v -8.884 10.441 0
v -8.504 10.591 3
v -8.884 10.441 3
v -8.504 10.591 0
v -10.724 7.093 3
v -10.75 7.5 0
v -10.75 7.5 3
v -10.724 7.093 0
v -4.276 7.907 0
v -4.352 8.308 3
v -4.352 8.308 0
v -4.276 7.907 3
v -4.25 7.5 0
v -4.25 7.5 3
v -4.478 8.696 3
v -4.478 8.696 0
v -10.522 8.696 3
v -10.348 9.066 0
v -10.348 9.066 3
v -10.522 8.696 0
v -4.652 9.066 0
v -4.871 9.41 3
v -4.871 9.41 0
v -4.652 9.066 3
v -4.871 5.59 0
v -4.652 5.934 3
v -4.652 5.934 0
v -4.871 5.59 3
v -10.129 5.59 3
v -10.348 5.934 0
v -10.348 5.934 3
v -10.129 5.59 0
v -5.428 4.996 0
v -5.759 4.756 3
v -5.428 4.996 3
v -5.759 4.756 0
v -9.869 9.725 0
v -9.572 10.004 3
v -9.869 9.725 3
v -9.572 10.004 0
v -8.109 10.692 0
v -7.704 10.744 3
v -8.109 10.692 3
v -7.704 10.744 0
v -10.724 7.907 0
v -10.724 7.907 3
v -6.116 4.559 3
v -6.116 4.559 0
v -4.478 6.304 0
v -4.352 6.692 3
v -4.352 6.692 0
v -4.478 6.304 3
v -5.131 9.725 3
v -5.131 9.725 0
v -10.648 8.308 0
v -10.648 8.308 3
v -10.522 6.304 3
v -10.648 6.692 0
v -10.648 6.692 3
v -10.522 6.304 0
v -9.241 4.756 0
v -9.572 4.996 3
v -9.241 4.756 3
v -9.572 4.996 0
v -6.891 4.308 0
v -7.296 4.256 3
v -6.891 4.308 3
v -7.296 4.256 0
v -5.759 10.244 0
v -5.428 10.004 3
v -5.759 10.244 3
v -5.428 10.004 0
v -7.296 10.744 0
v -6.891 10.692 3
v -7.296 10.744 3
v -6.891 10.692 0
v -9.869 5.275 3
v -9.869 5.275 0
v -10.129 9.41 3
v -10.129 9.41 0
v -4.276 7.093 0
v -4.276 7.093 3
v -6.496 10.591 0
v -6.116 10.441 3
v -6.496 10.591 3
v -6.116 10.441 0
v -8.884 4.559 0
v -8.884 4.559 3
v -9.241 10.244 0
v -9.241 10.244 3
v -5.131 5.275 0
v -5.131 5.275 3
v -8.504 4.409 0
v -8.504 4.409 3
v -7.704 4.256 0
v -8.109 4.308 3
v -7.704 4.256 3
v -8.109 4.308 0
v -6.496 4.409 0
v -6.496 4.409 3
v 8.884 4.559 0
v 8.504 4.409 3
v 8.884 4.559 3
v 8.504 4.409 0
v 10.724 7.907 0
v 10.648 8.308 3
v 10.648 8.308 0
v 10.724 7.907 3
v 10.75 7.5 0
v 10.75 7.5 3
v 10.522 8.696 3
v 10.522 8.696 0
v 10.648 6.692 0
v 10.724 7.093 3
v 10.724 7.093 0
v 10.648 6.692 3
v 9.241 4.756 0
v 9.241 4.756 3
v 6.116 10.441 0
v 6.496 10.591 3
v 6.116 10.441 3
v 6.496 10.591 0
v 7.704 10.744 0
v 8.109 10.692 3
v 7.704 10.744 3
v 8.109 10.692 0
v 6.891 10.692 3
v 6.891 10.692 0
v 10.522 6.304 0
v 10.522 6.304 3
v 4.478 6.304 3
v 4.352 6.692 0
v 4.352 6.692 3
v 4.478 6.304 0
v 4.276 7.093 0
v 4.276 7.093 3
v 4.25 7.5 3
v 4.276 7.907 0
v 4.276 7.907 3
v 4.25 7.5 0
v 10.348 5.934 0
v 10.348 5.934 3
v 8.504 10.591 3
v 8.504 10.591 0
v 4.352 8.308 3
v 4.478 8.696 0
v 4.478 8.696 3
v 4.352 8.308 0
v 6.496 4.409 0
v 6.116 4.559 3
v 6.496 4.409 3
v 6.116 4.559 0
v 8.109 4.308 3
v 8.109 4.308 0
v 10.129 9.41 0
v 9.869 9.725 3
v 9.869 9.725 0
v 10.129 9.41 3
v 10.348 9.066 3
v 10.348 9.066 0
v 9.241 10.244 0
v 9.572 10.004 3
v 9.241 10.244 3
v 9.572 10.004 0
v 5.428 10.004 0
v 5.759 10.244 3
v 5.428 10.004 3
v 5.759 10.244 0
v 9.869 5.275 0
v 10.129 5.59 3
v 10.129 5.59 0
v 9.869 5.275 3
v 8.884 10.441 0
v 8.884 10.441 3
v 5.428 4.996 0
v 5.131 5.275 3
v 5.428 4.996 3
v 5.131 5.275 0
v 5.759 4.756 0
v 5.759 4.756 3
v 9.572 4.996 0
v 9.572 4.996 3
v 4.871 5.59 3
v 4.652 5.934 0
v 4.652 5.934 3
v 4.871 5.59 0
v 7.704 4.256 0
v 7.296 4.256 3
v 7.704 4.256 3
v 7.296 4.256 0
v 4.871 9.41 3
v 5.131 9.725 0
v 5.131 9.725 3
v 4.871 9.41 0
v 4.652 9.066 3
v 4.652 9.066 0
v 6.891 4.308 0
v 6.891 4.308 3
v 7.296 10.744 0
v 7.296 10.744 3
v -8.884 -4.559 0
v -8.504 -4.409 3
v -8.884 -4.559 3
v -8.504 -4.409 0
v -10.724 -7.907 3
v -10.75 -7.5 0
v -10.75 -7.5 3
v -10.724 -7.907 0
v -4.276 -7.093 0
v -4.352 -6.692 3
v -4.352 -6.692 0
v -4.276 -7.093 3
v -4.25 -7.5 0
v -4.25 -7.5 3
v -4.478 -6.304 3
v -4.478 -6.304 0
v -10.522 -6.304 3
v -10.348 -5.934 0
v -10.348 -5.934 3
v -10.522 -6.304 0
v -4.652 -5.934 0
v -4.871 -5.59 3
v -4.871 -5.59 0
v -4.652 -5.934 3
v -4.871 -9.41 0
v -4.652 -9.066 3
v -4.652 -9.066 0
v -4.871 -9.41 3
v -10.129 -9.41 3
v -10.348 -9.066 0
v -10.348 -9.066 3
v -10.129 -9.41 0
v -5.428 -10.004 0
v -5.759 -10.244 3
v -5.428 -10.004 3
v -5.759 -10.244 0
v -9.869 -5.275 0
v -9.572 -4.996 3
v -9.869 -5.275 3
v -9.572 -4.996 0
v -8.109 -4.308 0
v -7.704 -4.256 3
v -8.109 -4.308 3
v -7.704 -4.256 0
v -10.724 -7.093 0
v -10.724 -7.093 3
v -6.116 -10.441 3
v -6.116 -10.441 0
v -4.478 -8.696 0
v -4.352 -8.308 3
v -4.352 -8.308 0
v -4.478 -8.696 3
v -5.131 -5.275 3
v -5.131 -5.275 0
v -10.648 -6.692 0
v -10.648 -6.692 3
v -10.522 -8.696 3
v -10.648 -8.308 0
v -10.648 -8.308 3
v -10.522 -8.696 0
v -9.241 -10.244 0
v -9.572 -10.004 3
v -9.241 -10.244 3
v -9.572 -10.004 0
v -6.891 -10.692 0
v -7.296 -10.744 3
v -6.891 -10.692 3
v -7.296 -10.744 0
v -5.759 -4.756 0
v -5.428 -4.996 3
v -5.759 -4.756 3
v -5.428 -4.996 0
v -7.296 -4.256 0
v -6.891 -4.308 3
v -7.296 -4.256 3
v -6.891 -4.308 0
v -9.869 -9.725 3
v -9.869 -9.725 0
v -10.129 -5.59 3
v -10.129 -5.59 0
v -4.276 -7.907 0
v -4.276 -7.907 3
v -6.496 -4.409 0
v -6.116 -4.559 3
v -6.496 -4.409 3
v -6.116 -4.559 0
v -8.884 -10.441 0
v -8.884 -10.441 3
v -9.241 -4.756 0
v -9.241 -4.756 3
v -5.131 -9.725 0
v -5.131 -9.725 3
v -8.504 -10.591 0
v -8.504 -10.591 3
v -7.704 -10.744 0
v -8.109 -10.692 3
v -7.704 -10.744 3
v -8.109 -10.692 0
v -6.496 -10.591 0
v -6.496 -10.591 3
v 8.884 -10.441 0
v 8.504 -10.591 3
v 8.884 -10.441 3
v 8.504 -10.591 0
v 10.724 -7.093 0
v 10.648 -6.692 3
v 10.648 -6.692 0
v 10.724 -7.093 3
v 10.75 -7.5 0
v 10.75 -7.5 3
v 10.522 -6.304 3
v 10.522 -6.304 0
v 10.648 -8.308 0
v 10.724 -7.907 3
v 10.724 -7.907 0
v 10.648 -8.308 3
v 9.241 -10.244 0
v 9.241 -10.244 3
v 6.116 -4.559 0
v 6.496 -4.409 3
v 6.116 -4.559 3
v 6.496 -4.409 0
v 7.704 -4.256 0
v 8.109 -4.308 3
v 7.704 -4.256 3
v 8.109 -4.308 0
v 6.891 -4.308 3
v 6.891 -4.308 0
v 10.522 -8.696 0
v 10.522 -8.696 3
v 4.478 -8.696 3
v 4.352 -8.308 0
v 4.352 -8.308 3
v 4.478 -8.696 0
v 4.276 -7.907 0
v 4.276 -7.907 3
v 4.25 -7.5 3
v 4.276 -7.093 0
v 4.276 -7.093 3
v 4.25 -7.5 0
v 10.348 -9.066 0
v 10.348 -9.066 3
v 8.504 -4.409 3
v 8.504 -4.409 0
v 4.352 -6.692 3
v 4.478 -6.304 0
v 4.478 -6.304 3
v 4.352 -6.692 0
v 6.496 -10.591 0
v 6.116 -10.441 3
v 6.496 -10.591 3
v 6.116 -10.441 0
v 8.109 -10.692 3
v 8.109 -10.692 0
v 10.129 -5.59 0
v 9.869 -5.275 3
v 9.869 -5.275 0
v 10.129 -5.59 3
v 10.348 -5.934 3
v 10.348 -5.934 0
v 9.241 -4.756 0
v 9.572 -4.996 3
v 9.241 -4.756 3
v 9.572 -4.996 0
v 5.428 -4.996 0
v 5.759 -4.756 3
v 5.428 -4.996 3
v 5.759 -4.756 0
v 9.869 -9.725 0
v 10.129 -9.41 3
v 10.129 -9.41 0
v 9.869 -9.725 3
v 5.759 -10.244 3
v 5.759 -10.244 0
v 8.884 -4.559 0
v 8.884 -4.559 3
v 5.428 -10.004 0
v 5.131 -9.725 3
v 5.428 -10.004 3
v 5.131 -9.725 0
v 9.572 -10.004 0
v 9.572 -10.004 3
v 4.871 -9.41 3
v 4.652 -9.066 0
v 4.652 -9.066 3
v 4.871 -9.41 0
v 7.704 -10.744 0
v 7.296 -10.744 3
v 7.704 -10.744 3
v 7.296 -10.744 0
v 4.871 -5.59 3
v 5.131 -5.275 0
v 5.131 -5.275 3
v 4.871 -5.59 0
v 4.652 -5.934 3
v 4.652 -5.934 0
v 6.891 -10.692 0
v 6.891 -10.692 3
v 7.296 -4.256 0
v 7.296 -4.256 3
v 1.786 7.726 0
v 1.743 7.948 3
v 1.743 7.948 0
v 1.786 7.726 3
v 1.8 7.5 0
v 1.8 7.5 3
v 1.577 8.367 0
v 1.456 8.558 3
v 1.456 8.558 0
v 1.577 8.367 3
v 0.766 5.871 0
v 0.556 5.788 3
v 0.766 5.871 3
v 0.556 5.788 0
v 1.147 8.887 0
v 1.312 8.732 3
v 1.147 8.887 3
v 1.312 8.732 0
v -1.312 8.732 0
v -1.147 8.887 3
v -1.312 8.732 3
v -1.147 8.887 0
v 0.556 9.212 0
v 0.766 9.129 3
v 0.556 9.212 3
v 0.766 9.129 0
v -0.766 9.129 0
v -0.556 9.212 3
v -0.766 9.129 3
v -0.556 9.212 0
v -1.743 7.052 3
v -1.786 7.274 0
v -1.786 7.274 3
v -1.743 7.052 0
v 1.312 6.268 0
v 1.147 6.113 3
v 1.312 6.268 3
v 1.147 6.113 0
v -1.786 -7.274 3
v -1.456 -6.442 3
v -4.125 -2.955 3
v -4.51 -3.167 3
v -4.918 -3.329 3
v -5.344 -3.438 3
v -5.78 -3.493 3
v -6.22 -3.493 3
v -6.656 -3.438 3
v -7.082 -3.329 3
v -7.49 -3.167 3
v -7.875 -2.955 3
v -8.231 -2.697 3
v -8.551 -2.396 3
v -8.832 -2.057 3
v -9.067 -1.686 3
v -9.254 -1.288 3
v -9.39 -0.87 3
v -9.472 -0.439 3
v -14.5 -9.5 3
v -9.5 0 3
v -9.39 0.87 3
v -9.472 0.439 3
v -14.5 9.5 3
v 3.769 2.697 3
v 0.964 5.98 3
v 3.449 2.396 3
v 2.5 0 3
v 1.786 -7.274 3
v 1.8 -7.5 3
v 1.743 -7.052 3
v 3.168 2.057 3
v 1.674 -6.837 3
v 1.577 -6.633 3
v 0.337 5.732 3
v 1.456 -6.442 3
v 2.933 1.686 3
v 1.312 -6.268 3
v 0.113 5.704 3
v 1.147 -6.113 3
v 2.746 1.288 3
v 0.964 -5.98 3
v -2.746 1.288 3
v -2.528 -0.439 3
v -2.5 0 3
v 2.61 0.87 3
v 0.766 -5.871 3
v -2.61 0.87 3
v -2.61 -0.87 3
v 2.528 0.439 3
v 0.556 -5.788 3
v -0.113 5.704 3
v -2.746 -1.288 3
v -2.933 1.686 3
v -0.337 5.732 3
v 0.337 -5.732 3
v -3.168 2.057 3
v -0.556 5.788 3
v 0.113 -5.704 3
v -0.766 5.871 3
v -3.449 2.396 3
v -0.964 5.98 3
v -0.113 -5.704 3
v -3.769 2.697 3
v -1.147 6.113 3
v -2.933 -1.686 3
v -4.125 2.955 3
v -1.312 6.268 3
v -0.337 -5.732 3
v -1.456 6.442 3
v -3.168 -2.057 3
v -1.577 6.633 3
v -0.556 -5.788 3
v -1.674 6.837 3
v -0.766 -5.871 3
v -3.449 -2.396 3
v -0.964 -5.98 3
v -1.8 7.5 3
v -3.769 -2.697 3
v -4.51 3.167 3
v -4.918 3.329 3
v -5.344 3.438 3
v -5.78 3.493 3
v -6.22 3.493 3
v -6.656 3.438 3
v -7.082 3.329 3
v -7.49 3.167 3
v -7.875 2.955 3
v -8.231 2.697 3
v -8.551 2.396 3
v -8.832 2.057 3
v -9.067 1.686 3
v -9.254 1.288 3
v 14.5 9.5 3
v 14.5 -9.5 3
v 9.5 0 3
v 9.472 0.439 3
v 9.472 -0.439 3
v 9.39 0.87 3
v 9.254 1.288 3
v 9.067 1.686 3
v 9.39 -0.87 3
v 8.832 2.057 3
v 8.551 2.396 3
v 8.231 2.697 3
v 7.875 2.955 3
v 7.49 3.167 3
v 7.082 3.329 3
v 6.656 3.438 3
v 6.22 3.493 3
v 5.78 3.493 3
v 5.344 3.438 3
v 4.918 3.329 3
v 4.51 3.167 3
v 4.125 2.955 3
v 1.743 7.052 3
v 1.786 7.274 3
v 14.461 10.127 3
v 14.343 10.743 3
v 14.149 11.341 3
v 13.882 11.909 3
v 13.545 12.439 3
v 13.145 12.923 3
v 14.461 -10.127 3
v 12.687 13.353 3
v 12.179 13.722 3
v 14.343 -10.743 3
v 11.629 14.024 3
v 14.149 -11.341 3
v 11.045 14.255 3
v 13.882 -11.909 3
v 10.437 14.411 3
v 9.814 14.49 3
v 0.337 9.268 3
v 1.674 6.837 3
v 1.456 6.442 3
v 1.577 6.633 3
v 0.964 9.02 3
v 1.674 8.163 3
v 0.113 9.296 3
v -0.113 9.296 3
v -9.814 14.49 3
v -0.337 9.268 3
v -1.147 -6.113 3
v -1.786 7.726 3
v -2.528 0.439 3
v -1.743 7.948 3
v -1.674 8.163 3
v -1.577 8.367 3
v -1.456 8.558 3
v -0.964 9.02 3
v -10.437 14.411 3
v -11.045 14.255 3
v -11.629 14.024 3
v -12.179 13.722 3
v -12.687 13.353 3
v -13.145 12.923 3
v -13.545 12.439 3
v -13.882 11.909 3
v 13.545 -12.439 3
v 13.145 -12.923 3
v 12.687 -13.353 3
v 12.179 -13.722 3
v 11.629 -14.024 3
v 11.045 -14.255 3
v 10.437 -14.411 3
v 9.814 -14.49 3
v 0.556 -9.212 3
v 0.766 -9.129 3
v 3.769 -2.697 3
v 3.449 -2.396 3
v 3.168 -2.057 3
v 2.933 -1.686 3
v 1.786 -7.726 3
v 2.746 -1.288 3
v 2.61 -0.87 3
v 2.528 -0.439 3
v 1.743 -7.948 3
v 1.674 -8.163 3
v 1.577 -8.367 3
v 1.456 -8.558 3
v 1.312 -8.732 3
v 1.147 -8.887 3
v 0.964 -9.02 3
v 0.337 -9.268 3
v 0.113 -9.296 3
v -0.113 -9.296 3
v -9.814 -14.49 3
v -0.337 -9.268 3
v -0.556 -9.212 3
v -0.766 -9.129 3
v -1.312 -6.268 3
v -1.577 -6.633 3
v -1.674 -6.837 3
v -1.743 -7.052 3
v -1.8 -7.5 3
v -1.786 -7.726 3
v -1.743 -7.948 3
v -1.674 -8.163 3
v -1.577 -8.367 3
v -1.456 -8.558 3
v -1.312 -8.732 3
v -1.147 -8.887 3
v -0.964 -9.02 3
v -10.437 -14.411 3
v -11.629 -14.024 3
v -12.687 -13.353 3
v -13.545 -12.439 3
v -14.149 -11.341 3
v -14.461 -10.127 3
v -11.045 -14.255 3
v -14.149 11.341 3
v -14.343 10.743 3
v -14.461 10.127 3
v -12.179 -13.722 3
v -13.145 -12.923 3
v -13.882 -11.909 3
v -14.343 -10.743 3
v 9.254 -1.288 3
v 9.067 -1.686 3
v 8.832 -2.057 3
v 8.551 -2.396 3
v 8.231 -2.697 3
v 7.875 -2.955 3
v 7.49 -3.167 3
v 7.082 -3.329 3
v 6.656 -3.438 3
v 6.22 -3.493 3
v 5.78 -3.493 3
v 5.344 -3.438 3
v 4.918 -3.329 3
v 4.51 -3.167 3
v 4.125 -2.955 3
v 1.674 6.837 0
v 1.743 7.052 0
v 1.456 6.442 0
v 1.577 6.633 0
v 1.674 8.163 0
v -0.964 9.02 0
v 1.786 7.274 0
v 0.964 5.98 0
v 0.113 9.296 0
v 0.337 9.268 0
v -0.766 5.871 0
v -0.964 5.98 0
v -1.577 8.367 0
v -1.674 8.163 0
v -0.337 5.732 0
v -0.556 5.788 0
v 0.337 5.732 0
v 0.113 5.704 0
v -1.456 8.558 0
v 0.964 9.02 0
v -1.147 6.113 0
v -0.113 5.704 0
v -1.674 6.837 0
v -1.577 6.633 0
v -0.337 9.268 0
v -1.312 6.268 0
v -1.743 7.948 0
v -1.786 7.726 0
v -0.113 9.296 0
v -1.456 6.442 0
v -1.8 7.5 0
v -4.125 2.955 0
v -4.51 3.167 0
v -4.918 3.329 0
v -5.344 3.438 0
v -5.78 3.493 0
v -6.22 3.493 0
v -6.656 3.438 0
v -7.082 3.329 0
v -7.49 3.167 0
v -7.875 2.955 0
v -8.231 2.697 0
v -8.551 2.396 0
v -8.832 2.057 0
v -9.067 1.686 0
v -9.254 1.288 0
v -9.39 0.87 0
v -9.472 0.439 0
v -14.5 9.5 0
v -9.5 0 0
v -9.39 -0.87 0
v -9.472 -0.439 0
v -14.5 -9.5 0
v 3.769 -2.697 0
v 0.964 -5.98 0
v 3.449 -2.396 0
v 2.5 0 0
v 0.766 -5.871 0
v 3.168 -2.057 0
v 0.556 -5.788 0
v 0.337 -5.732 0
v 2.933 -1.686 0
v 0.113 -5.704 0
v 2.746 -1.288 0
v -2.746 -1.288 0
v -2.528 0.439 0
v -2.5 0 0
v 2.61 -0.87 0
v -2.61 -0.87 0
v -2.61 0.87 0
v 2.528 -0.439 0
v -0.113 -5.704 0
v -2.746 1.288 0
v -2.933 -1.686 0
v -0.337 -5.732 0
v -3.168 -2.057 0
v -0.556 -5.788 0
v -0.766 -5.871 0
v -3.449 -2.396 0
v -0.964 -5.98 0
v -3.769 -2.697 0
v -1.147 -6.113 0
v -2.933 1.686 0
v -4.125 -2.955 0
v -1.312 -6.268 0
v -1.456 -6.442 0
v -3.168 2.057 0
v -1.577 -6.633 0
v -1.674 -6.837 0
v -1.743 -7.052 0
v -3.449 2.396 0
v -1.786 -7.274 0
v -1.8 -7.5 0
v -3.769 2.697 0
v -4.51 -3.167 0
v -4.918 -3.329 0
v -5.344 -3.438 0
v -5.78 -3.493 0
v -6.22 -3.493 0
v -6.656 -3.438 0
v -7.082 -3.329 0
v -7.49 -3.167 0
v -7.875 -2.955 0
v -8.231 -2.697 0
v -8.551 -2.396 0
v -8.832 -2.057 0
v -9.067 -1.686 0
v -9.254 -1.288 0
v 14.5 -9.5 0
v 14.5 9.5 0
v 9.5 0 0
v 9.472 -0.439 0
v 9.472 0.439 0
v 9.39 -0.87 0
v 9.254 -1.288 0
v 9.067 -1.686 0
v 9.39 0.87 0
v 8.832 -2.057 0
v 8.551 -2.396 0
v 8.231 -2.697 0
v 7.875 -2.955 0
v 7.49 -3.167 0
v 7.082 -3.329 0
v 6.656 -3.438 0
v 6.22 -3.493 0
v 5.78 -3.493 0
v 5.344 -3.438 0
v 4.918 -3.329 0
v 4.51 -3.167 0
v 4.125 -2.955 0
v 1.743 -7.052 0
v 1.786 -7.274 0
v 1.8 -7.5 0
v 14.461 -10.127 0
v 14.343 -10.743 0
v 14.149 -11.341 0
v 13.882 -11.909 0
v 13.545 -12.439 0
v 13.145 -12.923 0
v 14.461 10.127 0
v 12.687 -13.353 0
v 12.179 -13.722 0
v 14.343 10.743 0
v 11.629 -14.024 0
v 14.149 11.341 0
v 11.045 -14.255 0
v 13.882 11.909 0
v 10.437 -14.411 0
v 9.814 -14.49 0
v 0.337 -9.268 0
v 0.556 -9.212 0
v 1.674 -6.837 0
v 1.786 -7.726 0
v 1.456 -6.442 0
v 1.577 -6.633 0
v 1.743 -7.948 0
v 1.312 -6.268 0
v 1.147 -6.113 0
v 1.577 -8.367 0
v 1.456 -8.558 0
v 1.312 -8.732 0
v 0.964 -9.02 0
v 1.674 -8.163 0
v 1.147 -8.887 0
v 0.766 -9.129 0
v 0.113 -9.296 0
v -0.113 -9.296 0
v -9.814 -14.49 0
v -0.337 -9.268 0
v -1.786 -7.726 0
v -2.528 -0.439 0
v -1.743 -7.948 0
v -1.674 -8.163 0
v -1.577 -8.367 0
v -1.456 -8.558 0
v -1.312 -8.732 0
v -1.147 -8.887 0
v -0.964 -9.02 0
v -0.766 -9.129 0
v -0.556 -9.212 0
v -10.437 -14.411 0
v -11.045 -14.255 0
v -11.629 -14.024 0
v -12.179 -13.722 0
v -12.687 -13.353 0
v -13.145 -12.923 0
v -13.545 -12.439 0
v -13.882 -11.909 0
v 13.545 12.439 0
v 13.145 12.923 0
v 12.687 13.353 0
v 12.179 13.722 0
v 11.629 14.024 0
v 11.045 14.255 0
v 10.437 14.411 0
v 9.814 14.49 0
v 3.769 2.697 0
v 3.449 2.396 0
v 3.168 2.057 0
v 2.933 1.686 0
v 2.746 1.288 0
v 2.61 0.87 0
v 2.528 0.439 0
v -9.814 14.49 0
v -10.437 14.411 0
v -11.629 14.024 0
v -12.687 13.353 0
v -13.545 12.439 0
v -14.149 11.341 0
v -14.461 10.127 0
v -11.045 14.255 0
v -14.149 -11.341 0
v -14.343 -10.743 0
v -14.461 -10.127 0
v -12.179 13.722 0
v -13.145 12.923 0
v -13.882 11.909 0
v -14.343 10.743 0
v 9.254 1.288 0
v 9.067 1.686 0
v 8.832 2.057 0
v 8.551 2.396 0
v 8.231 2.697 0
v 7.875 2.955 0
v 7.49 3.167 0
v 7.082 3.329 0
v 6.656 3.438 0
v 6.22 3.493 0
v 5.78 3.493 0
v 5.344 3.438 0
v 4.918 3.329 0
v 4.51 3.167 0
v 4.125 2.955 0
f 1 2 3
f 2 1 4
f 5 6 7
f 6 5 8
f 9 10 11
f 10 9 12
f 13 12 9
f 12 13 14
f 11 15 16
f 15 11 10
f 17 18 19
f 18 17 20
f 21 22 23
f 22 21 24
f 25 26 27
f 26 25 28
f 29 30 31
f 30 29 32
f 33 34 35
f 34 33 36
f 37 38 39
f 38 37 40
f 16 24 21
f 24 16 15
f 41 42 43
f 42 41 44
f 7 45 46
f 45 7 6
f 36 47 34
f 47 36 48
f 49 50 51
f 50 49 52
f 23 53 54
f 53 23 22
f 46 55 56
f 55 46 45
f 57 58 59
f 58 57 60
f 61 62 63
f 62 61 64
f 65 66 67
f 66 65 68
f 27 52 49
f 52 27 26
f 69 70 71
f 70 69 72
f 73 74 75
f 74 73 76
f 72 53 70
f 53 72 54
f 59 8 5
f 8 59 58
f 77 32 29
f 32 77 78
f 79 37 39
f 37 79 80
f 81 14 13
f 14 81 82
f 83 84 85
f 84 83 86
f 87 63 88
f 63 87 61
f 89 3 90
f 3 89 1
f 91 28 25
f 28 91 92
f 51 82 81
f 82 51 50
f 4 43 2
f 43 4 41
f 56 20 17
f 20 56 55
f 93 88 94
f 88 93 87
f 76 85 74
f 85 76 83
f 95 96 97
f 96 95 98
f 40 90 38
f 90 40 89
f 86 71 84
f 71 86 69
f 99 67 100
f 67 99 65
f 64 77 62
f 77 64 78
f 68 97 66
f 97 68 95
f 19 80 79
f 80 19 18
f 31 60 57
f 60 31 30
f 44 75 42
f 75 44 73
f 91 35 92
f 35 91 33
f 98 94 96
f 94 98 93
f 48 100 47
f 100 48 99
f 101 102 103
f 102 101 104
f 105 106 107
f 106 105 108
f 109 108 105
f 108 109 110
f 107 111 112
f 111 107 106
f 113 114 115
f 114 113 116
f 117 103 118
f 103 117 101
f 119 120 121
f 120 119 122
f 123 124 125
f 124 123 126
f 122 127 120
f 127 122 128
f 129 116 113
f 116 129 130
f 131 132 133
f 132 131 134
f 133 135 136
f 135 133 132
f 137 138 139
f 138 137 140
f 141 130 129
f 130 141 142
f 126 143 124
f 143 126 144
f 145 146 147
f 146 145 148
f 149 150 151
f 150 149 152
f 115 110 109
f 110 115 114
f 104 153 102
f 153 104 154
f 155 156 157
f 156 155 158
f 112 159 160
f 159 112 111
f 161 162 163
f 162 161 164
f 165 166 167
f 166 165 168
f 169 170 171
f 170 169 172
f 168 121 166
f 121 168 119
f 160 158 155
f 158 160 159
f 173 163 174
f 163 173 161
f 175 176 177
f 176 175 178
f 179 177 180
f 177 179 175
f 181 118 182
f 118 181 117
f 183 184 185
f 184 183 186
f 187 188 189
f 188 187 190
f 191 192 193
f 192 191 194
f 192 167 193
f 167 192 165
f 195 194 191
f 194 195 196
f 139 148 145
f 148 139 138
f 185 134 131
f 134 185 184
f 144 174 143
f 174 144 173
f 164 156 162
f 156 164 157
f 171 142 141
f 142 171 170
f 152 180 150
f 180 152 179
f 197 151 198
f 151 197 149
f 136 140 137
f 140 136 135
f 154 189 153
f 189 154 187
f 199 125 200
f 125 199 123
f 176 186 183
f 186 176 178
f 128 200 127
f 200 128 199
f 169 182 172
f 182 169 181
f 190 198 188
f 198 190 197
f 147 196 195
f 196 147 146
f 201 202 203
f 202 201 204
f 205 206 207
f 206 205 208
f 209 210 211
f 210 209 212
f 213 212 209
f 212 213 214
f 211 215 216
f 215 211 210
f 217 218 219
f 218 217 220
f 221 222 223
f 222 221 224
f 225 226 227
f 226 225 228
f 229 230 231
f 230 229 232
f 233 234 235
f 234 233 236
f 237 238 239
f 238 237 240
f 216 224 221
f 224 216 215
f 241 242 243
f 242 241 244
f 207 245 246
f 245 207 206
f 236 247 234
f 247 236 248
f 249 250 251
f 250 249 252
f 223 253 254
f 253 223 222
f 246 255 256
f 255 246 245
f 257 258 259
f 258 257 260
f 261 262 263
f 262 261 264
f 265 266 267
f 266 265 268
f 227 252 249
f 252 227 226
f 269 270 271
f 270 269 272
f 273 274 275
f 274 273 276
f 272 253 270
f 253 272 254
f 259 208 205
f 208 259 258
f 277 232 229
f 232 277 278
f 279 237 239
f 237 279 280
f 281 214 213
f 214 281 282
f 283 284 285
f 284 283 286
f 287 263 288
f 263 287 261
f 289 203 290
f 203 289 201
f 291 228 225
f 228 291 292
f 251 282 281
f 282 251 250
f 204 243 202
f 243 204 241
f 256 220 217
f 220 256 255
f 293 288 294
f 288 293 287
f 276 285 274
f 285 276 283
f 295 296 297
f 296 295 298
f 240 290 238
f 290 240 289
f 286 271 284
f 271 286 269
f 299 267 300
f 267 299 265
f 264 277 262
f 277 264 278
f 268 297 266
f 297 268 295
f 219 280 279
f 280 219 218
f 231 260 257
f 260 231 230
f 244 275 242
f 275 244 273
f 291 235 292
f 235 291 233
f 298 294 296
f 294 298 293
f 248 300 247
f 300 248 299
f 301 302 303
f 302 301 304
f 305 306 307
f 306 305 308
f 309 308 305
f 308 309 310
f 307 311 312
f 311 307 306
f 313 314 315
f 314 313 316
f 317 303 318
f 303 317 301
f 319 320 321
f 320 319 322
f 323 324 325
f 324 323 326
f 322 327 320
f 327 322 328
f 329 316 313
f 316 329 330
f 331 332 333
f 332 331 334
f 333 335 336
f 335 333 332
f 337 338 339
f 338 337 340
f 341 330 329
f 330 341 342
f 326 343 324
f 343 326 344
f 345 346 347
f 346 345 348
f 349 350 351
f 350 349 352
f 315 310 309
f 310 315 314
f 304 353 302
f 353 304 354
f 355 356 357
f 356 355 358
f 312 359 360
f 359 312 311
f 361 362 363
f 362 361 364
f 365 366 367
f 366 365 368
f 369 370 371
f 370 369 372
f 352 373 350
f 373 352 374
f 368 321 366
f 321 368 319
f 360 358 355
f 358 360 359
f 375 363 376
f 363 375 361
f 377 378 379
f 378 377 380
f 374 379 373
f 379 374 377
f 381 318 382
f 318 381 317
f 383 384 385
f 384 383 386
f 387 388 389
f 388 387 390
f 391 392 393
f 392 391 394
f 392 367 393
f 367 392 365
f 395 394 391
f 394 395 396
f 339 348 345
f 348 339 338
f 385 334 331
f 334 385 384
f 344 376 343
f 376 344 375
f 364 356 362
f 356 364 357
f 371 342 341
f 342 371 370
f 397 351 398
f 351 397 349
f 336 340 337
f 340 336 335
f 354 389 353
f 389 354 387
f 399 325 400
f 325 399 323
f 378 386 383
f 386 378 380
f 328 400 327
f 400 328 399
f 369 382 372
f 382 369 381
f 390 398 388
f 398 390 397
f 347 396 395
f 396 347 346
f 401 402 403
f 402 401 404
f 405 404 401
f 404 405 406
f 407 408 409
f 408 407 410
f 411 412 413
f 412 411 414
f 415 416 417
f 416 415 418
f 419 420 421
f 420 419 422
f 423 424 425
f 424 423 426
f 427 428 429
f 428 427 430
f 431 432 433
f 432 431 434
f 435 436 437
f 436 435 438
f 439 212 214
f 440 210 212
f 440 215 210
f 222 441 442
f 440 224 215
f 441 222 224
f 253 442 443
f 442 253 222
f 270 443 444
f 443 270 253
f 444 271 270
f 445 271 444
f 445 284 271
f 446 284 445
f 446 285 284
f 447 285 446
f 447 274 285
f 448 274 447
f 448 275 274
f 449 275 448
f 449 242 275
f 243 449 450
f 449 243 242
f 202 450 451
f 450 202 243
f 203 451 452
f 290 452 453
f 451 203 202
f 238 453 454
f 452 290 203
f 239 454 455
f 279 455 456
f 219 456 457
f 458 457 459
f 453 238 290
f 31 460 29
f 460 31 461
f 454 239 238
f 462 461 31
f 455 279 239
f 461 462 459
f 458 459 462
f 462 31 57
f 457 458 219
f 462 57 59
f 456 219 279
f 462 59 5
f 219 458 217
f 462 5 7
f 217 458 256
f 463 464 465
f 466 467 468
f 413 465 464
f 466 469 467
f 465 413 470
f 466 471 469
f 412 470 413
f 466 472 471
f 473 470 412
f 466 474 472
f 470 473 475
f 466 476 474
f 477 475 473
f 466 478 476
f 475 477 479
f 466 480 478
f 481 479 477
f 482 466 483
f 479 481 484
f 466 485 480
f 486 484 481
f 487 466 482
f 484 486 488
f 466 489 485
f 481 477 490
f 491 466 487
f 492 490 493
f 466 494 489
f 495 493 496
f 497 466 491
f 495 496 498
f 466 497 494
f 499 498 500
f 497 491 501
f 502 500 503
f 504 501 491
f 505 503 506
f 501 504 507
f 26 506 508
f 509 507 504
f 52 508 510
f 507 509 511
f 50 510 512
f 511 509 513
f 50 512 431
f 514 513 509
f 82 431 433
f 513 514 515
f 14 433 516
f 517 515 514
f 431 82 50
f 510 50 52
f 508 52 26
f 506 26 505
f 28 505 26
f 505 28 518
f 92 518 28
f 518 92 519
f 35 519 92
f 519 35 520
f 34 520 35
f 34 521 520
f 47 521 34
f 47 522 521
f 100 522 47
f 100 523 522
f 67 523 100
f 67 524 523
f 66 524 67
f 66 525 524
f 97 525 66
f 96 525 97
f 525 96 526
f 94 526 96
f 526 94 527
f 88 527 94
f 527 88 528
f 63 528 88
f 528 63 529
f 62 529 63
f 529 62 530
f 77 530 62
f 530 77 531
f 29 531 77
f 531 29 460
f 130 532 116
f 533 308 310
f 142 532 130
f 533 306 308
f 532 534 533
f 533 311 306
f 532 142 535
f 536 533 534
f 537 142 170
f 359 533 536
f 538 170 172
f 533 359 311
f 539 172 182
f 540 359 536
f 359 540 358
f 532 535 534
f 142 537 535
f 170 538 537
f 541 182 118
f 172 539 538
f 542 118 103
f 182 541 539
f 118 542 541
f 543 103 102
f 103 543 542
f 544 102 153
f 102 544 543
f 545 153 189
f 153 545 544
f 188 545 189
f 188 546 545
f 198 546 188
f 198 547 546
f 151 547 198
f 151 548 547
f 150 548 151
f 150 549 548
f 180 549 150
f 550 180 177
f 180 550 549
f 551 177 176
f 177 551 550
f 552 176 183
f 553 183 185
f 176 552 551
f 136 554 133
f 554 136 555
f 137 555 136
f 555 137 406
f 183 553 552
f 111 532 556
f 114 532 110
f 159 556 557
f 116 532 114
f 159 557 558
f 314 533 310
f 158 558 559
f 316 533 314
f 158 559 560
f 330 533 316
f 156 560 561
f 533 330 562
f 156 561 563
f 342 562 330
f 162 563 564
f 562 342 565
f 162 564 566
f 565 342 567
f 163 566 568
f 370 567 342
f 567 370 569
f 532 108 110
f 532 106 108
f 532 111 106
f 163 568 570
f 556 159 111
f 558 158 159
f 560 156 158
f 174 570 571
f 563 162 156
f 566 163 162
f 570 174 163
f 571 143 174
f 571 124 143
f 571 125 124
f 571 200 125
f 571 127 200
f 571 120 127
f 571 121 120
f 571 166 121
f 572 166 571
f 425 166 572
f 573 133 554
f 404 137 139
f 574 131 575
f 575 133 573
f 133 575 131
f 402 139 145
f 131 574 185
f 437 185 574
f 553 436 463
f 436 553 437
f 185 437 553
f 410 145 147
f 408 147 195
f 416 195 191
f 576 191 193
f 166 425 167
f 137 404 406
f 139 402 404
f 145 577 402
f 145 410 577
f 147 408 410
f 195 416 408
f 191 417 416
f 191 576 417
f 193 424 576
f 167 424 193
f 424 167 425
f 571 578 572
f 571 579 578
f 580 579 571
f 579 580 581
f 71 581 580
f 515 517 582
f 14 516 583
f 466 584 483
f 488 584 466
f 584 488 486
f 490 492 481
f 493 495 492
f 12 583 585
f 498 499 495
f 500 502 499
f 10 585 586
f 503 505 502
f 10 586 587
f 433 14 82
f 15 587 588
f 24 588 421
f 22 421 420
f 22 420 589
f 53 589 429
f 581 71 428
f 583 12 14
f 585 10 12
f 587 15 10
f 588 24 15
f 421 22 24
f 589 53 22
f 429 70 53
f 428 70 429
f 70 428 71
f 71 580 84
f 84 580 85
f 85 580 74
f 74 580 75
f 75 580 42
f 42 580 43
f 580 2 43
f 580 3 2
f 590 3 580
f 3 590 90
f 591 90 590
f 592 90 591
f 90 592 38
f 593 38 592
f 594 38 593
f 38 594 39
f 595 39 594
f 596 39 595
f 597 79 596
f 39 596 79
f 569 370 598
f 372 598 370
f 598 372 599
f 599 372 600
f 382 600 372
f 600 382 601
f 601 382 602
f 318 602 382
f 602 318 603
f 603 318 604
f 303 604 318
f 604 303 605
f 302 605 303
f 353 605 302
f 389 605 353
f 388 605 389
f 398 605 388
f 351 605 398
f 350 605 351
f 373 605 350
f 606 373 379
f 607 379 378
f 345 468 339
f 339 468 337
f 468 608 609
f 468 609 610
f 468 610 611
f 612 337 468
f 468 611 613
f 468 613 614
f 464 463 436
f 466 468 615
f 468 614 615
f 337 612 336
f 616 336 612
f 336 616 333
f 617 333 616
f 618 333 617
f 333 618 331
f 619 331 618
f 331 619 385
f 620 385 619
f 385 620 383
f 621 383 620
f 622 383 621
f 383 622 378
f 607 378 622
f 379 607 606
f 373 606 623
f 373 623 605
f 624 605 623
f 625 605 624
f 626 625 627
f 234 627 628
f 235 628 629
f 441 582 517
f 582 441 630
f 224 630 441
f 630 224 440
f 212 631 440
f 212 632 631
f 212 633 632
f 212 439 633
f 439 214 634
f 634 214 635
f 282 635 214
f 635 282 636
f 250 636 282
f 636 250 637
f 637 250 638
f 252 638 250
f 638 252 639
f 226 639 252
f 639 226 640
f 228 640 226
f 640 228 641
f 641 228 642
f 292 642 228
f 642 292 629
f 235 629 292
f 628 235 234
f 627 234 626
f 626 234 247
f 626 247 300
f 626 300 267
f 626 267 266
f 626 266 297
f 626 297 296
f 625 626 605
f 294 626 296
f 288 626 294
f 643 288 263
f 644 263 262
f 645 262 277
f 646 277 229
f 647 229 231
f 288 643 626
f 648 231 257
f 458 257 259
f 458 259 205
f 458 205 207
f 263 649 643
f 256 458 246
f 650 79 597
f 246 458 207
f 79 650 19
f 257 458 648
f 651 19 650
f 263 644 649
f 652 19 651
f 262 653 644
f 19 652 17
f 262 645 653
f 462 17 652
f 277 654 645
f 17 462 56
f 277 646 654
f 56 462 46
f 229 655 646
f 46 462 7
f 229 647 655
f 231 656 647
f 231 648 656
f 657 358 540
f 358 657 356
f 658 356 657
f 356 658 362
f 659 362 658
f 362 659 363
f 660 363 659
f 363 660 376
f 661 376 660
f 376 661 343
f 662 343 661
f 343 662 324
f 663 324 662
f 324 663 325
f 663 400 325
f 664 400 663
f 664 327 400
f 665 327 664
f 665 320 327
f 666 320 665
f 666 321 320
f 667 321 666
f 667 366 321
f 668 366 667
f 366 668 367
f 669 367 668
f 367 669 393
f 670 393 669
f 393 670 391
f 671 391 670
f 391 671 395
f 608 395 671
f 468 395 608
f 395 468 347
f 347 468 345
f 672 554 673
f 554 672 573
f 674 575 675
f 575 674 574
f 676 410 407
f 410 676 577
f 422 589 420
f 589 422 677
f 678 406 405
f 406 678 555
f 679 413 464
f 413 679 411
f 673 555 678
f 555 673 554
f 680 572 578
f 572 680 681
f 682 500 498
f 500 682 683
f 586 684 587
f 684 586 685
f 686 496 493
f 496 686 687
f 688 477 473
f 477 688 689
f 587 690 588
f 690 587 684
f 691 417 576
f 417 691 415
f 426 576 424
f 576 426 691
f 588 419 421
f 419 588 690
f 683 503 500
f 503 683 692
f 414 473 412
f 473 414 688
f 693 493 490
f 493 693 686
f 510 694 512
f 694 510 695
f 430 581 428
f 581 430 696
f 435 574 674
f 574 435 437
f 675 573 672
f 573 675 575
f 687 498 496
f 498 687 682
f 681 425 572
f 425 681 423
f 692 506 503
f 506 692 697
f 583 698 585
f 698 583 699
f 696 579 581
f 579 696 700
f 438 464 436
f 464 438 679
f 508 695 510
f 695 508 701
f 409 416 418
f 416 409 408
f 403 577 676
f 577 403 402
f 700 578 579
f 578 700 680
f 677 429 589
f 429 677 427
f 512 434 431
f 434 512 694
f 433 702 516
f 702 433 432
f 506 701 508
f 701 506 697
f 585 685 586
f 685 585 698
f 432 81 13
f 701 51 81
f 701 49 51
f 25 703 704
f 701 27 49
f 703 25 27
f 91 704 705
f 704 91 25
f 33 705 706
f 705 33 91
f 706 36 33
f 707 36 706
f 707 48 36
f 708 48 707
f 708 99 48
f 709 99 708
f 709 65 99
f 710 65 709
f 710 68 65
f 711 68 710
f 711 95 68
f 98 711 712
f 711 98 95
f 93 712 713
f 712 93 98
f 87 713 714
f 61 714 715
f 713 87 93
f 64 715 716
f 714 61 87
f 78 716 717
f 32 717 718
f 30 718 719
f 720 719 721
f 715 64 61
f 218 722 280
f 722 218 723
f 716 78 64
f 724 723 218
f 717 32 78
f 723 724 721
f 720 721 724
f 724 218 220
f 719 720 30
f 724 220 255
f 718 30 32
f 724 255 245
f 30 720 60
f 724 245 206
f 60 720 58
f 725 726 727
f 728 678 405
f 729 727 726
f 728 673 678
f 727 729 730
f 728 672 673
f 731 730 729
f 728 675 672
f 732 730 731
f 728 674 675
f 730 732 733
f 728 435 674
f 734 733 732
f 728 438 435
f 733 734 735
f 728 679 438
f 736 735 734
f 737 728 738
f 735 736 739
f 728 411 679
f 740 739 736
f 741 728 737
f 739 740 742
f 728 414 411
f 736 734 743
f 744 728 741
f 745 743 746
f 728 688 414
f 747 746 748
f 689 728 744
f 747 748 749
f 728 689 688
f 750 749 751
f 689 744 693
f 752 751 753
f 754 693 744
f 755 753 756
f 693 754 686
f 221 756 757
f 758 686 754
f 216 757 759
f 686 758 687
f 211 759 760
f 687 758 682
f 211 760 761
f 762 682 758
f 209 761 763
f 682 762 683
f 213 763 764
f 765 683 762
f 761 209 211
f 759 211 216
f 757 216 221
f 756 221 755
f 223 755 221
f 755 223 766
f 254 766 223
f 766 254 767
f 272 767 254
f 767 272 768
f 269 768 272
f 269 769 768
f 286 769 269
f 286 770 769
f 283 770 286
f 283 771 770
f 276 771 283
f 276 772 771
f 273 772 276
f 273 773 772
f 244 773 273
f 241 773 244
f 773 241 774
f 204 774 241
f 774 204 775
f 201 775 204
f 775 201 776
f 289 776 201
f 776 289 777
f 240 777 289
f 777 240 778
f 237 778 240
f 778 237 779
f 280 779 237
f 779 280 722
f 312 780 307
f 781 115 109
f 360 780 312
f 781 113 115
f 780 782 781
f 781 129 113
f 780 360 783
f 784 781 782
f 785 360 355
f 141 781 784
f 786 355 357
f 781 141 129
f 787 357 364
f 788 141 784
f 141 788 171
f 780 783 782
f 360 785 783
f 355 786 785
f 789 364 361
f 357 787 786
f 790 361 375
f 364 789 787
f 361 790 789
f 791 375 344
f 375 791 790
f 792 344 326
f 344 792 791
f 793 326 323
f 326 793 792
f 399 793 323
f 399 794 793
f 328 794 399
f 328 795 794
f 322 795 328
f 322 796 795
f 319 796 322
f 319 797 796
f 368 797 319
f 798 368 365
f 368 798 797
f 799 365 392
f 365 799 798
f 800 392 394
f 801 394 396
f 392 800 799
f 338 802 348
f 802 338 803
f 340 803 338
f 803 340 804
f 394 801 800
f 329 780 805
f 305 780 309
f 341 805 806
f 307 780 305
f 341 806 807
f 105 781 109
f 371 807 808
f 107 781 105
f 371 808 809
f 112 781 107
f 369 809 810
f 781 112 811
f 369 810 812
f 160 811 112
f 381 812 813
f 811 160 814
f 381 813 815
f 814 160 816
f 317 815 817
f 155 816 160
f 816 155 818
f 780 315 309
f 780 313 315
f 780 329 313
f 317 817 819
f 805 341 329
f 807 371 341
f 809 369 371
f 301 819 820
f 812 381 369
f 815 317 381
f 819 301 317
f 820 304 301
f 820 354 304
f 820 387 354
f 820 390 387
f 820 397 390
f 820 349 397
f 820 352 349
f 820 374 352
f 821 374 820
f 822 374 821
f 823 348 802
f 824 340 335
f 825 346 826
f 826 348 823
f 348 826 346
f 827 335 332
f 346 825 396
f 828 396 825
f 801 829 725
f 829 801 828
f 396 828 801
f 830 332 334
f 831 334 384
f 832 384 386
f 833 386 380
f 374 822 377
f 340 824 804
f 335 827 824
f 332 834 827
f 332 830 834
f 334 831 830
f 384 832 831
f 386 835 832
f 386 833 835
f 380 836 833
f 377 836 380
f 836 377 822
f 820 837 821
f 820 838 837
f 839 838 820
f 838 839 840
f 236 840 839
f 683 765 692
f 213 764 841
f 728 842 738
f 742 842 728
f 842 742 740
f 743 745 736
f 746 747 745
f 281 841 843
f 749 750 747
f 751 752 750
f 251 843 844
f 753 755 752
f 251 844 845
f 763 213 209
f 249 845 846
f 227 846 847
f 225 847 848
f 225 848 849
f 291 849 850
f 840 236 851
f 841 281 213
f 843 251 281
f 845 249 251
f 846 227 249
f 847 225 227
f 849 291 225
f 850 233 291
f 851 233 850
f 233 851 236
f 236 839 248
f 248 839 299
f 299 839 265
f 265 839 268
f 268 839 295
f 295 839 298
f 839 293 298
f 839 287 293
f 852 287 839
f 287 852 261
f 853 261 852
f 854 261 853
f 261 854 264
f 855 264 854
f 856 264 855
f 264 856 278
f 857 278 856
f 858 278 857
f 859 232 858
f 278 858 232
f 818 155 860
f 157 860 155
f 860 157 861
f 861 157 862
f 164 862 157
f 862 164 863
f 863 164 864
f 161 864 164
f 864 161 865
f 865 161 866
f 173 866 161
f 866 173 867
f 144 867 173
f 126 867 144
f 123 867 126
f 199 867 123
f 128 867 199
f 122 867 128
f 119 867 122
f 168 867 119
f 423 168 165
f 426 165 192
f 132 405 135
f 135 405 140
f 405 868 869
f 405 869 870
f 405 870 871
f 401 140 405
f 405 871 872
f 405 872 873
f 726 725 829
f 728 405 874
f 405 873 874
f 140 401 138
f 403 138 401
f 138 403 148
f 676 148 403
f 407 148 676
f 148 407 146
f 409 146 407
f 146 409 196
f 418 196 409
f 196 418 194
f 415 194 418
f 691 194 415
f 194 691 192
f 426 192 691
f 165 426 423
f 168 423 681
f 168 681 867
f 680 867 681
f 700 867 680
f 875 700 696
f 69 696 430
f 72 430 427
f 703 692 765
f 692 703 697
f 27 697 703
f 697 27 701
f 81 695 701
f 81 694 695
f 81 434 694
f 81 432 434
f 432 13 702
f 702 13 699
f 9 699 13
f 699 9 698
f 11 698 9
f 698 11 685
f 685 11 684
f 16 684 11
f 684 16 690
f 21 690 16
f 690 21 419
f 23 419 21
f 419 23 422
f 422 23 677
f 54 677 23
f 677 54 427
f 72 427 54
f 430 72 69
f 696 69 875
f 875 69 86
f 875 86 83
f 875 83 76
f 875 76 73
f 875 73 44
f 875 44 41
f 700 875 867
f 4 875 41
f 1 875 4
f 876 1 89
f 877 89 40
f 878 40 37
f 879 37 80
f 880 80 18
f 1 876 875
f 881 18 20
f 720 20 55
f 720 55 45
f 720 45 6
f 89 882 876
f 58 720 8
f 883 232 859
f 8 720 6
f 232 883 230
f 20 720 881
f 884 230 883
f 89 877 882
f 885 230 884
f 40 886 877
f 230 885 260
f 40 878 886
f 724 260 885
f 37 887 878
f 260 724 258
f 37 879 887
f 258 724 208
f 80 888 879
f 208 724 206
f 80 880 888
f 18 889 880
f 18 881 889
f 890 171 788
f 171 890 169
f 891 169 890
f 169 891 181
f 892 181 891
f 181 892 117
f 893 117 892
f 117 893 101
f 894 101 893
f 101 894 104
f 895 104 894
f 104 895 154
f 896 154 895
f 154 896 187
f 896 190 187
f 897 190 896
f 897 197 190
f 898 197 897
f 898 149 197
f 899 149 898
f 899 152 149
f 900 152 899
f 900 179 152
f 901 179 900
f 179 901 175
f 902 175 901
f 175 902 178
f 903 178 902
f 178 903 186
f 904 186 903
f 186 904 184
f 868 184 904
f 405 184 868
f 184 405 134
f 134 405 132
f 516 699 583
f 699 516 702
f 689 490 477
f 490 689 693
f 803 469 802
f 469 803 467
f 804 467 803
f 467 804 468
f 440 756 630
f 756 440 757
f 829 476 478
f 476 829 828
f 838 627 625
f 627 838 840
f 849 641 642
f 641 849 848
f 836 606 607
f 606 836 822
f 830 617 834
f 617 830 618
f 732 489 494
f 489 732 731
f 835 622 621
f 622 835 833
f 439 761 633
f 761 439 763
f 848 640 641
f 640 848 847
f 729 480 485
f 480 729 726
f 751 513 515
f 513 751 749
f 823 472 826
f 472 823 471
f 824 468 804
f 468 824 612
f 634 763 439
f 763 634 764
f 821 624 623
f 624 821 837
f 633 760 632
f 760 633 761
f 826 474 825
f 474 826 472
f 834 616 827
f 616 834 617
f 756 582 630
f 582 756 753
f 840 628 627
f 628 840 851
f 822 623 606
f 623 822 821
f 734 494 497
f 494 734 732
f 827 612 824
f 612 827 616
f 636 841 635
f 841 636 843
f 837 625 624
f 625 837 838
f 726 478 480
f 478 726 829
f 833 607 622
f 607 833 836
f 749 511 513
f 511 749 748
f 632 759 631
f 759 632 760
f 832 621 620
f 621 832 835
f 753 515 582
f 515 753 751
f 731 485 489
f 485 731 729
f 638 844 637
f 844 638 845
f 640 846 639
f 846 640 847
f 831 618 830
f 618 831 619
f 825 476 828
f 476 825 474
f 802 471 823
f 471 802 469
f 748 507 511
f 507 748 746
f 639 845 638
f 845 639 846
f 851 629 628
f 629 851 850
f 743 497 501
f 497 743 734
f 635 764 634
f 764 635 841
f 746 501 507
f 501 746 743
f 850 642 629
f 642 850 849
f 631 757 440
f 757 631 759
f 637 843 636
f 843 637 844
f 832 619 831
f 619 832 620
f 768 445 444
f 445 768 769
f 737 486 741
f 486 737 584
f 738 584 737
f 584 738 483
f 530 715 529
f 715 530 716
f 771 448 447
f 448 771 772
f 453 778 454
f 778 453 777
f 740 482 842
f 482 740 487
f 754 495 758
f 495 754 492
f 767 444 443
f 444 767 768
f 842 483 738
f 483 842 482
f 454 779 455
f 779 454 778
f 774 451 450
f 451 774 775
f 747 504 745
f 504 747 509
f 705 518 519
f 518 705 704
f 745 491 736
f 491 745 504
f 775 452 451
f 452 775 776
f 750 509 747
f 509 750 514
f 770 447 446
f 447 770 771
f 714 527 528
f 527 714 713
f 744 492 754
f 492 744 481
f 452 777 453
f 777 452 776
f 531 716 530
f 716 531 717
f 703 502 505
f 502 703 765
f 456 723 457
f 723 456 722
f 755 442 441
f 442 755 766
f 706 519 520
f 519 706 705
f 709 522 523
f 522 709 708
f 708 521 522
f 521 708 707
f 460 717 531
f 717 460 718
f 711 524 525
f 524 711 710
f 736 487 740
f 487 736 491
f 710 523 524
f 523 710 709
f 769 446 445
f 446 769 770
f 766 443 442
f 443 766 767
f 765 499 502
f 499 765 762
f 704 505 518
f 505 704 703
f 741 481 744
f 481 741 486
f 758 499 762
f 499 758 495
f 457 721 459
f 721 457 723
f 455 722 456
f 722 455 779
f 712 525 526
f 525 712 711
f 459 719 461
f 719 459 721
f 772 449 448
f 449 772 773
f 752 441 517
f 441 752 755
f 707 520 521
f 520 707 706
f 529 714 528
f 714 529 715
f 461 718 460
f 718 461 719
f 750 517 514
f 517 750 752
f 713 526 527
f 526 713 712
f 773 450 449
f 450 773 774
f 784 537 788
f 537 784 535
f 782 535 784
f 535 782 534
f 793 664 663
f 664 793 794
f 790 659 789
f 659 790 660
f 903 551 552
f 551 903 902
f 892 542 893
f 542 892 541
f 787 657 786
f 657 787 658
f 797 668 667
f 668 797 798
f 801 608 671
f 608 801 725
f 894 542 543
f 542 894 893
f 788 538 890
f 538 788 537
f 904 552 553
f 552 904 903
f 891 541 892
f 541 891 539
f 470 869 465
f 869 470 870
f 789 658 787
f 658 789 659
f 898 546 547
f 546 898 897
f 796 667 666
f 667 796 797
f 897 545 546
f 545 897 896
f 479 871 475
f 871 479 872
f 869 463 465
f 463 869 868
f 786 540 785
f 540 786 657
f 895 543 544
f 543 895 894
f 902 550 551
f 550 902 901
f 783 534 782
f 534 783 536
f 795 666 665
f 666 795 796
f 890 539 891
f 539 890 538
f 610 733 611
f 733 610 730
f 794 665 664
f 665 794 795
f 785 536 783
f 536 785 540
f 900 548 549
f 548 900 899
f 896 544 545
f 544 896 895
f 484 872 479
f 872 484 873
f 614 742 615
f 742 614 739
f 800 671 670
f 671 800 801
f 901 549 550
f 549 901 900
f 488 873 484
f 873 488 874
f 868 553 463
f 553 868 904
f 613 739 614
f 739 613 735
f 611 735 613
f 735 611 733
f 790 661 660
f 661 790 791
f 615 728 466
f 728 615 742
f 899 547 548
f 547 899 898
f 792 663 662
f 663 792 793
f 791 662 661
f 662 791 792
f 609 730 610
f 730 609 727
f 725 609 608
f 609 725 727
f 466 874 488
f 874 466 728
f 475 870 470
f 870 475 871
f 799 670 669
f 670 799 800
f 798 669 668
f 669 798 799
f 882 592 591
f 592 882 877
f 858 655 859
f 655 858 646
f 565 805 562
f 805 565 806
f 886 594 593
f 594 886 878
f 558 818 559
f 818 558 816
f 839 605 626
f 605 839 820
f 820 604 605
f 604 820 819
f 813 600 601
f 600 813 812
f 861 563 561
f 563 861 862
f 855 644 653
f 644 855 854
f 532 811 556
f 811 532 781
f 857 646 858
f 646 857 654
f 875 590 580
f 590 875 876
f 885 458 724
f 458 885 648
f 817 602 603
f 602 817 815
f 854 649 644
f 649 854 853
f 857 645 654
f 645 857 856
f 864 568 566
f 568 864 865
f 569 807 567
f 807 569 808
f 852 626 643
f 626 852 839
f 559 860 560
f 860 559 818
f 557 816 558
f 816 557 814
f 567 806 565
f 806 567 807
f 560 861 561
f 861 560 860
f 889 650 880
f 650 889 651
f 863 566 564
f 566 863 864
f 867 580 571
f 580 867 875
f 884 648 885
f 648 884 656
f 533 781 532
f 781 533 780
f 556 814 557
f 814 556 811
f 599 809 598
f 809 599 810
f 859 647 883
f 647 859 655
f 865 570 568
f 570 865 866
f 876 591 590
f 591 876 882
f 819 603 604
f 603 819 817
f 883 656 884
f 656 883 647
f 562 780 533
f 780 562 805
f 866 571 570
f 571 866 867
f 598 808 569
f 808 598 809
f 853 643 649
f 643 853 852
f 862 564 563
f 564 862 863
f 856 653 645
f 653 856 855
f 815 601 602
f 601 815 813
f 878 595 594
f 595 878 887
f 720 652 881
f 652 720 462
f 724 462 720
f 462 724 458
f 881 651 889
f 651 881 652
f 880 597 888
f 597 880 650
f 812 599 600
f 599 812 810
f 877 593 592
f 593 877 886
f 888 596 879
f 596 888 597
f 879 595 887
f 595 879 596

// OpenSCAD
$fn = 50;


difference() {
	union() {
		hull() {
			translate(v = [-9.5000000000, 9.5000000000, 0]) {
				cylinder(h = 3, r = 5);
			}
			translate(v = [9.5000000000, 9.5000000000, 0]) {
				cylinder(h = 3, r = 5);
			}
			translate(v = [-9.5000000000, -9.5000000000, 0]) {
				cylinder(h = 3, r = 5);
			}
			translate(v = [9.5000000000, -9.5000000000, 0]) {
				cylinder(h = 3, r = 5);
			}
		}
	}
	union() {
		#translate(v = [-7.5000000000, 7.5000000000, 0]) {
			cylinder(h = 3, r = 3.2500000000);
		}
		#translate(v = [7.5000000000, 7.5000000000, 0]) {
			cylinder(h = 3, r = 3.2500000000);
		}
		#translate(v = [-7.5000000000, -7.5000000000, 0]) {
			cylinder(h = 3, r = 3.2500000000);
		}
		#translate(v = [7.5000000000, -7.5000000000, 0]) {
			cylinder(h = 3, r = 3.2500000000);
		}
		#translate(v = [-7.5000000000, -7.5000000000, -100.0000000000]) {
			cylinder(h = 200, r = 3.2500000000);
		}
		#translate(v = [-7.5000000000, 7.5000000000, -100.0000000000]) {
			cylinder(h = 200, r = 3.2500000000);
		}
		#translate(v = [7.5000000000, -7.5000000000, -100.0000000000]) {
			cylinder(h = 200, r = 3.2500000000);
		}
		#translate(v = [7.5000000000, 7.5000000000, -100.0000000000]) {
			cylinder(h = 200, r = 3.2500000000);
		}
		#translate(v = [-7.5000000000, 7.5000000000, 0]) {
			cylinder(h = 3, r = 1.8000000000);
		}
		#translate(v = [0.0000000000, 7.5000000000, 0]) {
			cylinder(h = 3, r = 1.8000000000);
		}
		#translate(v = [7.5000000000, 7.5000000000, 0]) {
			cylinder(h = 3, r = 1.8000000000);
		}
		#translate(v = [-7.5000000000, -7.5000000000, 0]) {
			cylinder(h = 3, r = 1.8000000000);
		}
		#translate(v = [0.0000000000, -7.5000000000, 0]) {
			cylinder(h = 3, r = 1.8000000000);
		}
		#translate(v = [7.5000000000, -7.5000000000, 0]) {
			cylinder(h = 3, r = 1.8000000000);
		}
		#translate(v = [-7.5000000000, 7.5000000000, 0]) {
			cylinder(h = 3, r = 1.8000000000);
		}
		#translate(v = [0.0000000000, 7.5000000000, 0]) {
			cylinder(h = 3, r = 1.8000000000);
		}
		#translate(v = [7.5000000000, 7.5000000000, 0]) {
			cylinder(h = 3, r = 1.8000000000);
		}
		#translate(v = [-7.5000000000, -7.5000000000, 0]) {
			cylinder(h = 3, r = 1.8000000000);
		}
		#translate(v = [0.0000000000, -7.5000000000, 0]) {
			cylinder(h = 3, r = 1.8000000000);
		}
		#translate(v = [7.5000000000, -7.5000000000, 0]) {
			cylinder(h = 3, r = 1.8000000000);
		}
		#translate(v = [-7.5000000000, 7.5000000000, 0]) {
			cylinder(h = 3, r = 1.8000000000);
		}
		#translate(v = [0.0000000000, 7.5000000000, 0]) {
			cylinder(h = 3, r = 1.8000000000);
		}
		#translate(v = [7.5000000000, 7.5000000000, 0]) {
			cylinder(h = 3, r = 1.8000000000);
		}
		#translate(v = [-7.5000000000, -7.5000000000, 0]) {
			cylinder(h = 3, r = 1.8000000000);
		}
		#translate(v = [0.0000000000, -7.5000000000, 0]) {
			cylinder(h = 3, r = 1.8000000000);
		}
		#translate(v = [7.5000000000, -7.5000000000, 0]) {
			cylinder(h = 3, r = 1.8000000000);
		}
		#translate(v = [-6.0000000000, 0, 0]) {
			cylinder(h = 3, r = 3.5000000000);
		}
		#translate(v = [6.0000000000, 0, 0]) {
			cylinder(h = 3, r = 3.5000000000);
		}
	}
}
